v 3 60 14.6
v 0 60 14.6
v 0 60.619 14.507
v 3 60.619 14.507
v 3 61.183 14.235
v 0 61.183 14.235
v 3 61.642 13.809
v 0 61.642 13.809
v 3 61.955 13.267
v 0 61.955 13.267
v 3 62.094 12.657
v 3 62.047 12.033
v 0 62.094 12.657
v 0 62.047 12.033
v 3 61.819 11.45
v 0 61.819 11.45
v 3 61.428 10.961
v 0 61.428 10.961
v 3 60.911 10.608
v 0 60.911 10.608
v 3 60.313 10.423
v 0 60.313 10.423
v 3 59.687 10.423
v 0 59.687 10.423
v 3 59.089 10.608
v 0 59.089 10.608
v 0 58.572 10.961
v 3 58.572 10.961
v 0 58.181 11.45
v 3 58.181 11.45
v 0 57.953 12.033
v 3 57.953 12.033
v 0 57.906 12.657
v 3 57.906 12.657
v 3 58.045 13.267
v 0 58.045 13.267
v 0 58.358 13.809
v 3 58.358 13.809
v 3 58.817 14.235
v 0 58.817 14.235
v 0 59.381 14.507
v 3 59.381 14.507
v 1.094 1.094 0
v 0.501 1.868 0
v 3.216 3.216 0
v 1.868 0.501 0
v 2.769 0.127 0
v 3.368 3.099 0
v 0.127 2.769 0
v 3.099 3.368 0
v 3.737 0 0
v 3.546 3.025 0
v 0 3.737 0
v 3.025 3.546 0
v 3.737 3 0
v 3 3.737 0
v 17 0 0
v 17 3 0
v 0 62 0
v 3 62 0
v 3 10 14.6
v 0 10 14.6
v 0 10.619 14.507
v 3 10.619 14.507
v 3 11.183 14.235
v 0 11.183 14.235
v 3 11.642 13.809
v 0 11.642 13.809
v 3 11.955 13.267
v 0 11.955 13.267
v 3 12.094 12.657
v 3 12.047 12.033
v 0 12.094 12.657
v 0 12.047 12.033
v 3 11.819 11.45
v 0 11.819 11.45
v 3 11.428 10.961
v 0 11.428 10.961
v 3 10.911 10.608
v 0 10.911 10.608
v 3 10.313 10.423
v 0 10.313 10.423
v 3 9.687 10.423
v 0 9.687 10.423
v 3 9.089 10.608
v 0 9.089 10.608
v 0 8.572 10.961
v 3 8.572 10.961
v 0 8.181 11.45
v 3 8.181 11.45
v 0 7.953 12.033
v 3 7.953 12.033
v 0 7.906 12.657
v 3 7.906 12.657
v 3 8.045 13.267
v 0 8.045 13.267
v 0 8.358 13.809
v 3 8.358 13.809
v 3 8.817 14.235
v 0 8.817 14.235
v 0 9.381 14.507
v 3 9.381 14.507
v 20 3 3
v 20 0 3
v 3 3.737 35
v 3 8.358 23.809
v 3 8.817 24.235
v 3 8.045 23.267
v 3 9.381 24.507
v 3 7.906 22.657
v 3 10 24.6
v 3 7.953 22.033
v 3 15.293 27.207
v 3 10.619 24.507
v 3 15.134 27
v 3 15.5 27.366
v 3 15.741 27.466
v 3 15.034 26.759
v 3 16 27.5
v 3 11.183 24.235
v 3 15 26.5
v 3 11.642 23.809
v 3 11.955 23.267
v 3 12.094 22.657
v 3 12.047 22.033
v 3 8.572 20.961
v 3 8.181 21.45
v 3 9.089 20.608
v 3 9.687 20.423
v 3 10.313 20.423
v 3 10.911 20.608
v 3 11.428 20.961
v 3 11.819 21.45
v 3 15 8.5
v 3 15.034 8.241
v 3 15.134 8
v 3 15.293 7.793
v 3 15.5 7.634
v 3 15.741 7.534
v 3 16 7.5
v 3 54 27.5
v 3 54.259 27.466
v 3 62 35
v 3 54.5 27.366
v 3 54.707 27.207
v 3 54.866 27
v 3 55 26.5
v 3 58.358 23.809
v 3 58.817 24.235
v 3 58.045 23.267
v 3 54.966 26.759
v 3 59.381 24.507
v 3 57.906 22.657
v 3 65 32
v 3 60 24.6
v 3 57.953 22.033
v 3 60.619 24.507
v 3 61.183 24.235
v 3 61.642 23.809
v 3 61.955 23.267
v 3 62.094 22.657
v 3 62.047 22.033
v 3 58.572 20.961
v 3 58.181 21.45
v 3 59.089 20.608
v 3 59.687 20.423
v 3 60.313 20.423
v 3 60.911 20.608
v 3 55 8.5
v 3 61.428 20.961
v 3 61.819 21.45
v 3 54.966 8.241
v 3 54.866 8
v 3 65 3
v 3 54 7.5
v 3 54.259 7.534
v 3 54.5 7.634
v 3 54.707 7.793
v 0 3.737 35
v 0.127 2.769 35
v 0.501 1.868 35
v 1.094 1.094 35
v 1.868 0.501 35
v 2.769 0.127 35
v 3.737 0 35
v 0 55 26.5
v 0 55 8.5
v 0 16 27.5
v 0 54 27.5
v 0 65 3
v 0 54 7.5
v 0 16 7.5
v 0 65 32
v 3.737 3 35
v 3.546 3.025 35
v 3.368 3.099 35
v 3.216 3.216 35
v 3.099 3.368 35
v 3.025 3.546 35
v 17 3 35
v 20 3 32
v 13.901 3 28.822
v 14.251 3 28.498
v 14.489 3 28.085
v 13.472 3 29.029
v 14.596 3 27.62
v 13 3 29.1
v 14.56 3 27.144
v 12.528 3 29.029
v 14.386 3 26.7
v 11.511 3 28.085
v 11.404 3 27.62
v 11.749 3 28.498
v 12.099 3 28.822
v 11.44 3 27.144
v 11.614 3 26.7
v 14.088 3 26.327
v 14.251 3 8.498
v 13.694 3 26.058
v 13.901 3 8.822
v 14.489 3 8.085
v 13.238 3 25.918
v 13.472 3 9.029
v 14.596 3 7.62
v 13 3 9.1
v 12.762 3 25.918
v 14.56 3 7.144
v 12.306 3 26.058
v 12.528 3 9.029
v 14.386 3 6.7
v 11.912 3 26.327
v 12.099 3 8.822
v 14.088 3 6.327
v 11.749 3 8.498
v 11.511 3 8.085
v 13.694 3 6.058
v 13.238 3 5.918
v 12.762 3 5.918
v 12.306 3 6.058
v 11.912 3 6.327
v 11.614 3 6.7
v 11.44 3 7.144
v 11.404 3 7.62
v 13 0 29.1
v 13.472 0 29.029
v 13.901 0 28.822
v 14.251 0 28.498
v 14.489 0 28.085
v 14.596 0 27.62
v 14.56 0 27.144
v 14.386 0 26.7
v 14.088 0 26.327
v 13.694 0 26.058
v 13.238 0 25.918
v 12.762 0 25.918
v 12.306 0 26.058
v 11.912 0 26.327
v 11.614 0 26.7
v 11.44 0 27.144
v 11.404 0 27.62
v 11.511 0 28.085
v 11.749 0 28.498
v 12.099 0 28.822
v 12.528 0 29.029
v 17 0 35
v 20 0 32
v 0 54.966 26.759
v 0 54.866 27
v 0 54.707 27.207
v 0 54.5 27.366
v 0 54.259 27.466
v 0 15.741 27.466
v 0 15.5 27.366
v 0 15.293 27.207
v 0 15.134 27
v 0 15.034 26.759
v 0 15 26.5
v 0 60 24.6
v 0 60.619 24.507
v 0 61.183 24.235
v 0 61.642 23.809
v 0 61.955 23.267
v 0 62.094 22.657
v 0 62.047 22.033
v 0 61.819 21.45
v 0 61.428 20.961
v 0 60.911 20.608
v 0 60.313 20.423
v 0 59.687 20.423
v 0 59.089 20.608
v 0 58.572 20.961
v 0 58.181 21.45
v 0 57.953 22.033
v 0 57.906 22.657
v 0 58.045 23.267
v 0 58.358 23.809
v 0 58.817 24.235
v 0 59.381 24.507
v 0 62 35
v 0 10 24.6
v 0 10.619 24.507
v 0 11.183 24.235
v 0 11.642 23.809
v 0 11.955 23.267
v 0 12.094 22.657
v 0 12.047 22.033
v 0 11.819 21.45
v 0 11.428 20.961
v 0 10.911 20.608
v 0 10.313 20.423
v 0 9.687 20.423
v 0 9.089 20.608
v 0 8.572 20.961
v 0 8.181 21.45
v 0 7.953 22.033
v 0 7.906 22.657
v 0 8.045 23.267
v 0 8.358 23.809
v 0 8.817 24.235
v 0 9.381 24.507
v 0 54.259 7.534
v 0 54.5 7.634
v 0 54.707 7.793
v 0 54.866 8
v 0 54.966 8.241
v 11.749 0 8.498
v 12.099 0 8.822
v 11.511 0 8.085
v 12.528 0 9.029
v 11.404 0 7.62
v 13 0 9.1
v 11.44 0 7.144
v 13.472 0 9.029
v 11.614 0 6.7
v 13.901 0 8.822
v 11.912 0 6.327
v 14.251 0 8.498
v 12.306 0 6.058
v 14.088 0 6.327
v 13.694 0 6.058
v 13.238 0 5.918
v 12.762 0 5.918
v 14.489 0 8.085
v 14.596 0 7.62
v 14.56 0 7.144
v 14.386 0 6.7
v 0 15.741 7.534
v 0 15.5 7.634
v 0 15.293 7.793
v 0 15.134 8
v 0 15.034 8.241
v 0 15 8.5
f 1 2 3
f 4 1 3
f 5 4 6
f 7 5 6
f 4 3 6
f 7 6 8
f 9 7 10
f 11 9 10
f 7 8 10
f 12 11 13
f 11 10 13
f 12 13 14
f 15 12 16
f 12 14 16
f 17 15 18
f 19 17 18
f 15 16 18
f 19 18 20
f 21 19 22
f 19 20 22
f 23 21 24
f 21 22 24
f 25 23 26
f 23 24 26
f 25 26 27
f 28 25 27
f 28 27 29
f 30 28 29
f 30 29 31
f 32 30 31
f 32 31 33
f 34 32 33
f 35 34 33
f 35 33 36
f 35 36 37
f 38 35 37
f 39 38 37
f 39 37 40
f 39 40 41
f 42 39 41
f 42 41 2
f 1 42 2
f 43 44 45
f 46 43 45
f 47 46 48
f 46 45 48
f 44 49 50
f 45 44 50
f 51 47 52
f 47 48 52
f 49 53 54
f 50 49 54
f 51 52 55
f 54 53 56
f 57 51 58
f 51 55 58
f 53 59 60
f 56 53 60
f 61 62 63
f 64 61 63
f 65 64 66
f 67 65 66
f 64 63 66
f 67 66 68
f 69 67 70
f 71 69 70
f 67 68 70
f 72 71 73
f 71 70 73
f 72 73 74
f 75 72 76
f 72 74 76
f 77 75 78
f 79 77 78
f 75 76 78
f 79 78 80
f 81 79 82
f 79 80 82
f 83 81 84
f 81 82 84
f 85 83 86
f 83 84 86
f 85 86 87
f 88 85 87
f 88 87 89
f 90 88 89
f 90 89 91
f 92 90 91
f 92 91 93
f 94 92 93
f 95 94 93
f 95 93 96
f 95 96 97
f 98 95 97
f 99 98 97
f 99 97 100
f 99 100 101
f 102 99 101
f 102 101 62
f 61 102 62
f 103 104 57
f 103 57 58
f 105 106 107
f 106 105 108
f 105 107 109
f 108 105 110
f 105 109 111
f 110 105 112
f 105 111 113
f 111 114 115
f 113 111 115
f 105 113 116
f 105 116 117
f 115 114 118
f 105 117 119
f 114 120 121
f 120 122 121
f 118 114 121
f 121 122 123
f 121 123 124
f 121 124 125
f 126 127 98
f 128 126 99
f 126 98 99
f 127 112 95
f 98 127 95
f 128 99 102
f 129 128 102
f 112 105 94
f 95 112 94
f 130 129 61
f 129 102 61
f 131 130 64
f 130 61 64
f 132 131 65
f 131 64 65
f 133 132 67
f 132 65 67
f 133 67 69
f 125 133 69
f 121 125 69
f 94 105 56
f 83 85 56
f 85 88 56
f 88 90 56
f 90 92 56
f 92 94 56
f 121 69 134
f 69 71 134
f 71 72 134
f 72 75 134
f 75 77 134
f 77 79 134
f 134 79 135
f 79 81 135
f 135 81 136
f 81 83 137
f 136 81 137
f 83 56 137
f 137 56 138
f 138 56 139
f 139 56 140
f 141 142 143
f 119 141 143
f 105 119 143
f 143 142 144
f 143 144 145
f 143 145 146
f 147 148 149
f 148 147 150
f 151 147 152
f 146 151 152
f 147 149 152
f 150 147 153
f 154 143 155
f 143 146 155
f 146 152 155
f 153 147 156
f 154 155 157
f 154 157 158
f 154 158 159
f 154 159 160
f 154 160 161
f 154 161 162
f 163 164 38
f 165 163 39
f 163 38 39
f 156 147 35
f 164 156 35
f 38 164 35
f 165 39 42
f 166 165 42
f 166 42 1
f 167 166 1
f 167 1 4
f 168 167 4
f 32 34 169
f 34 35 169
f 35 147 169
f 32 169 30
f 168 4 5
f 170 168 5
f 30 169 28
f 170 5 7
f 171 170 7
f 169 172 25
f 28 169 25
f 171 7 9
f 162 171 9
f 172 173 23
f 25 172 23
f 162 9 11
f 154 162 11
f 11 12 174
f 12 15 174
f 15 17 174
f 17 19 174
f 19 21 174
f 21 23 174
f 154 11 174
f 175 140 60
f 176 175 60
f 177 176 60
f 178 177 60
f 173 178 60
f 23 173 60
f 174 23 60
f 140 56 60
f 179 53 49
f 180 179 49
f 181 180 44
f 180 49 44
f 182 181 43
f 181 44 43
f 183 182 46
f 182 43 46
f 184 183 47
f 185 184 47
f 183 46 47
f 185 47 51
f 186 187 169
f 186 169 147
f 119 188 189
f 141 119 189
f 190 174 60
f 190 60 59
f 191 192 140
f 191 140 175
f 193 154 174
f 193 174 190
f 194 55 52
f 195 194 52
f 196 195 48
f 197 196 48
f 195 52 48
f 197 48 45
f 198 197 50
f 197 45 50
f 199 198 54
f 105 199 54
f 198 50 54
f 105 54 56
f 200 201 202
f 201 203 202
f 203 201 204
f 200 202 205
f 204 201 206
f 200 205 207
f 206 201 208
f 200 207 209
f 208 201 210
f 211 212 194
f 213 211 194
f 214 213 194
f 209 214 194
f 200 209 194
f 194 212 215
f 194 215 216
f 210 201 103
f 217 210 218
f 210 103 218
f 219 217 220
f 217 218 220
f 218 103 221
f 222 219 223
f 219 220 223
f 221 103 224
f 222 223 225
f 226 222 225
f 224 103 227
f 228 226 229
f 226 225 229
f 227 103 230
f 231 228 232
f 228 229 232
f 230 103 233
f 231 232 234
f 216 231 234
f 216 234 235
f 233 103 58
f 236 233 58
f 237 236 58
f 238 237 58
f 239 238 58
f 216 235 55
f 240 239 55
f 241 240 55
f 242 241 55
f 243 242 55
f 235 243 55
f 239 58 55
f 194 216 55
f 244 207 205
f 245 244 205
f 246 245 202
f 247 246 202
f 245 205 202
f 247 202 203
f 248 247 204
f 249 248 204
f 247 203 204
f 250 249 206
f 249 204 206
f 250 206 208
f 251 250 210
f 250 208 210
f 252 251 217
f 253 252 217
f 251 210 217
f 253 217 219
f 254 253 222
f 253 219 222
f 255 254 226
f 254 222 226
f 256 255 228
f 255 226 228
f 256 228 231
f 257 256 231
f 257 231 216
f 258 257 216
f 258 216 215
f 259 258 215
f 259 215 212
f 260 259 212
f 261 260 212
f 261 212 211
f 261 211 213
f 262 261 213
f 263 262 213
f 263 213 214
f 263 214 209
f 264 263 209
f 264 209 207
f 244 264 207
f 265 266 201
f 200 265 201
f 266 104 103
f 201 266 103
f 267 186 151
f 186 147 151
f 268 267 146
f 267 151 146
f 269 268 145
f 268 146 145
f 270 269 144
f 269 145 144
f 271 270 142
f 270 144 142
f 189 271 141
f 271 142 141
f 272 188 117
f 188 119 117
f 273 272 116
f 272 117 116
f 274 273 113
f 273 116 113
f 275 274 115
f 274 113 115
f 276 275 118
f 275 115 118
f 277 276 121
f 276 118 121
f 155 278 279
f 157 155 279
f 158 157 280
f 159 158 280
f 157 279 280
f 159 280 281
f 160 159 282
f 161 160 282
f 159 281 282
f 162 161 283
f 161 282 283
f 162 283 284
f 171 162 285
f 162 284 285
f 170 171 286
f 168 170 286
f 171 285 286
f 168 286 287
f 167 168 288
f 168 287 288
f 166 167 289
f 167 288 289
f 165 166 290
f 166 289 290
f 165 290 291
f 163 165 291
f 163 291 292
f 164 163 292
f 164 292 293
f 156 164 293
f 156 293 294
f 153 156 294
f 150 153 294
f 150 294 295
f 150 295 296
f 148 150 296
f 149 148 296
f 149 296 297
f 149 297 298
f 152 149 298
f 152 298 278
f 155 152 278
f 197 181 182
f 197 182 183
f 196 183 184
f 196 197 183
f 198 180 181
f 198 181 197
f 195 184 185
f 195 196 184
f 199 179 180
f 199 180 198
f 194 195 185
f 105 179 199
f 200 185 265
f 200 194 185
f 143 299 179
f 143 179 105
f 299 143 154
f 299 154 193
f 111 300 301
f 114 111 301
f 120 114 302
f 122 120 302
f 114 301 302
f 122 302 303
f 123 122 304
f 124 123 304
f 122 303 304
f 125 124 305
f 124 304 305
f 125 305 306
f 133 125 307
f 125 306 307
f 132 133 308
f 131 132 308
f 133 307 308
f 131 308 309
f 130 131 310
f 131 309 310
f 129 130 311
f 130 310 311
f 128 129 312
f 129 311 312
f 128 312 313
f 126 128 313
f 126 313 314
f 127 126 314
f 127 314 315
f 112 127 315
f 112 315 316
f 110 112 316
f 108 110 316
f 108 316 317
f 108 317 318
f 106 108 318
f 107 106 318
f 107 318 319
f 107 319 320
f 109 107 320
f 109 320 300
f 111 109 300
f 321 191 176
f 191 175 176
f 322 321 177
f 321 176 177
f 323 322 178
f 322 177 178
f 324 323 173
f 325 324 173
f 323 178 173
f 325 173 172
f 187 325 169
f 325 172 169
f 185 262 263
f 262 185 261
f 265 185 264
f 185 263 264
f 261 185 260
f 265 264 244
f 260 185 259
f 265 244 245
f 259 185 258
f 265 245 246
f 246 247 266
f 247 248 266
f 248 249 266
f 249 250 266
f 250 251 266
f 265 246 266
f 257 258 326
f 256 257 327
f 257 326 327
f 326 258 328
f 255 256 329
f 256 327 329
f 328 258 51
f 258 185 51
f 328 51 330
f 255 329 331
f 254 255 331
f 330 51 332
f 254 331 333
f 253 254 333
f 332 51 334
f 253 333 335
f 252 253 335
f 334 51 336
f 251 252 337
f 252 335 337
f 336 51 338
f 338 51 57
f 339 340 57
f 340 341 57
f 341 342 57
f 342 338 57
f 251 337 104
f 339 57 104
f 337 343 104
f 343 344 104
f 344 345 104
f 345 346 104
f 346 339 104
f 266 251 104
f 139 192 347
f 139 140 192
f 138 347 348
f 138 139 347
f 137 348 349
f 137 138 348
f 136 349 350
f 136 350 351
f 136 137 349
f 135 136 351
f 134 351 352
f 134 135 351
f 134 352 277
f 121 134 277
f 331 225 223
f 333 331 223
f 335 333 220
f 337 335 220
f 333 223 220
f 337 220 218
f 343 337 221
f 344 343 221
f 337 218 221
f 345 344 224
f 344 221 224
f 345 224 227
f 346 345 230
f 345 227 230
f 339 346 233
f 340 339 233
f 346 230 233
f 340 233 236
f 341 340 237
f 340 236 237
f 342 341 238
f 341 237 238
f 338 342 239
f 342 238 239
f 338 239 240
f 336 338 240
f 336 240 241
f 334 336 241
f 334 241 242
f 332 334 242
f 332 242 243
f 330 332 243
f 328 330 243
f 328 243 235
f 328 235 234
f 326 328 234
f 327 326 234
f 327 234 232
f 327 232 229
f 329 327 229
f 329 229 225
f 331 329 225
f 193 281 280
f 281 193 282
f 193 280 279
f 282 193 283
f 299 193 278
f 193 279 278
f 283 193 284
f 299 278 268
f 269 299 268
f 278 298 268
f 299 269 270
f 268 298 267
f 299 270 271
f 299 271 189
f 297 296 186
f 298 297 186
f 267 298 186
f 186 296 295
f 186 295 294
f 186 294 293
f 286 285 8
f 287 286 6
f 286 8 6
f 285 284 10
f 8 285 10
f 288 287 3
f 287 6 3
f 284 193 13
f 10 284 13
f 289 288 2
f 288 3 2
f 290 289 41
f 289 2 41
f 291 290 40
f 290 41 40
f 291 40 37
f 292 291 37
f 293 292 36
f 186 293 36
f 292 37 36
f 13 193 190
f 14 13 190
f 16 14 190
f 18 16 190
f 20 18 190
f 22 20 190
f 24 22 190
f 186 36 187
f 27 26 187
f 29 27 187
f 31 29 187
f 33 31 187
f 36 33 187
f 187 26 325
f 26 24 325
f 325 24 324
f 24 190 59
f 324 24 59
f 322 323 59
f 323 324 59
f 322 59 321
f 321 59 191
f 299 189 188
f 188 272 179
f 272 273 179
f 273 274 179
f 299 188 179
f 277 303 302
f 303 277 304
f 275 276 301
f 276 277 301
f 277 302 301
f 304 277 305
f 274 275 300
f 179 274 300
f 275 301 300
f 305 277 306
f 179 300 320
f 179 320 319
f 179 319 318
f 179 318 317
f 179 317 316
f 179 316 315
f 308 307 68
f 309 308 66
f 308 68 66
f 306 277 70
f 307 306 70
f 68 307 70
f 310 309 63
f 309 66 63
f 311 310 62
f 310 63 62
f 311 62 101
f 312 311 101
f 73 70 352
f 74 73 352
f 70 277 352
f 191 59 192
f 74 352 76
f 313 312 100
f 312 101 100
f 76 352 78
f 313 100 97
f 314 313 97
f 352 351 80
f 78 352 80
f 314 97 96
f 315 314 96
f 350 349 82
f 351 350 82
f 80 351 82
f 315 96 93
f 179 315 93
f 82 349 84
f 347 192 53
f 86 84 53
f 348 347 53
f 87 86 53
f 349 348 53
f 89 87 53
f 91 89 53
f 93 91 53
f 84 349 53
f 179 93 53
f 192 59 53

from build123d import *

# Parameters (mm, degrees)
SM_BASE_FLANGE_1_DEPTH      = 35
SKETCH_2_R                  = 1.6
CUT_EXTRUDE_1_DEPTH         = 74.952687578
PATTERN_LINEAR_1_COUNT      = 2
PATTERN_LINEAR_1_PITCH      = 20
CHAMFER_1_SIZE              = 3
SKETCH_3_R                  = 2.1
CUT_EXTRUDE_2_DEPTH         = 77.485292704
PATTERN_LINEAR_2_COUNT      = 2
PATTERN_LINEAR_2_PITCH      = 10
PATTERN_LINEAR_2_COUNT_DIR2 = 2
PATTERN_LINEAR_2_PITCH_DIR2 = 50
SKETCH_4_W                  = 20
SKETCH_4_H                  = 40
CUT_EXTRUDE_3_DEPTH         = 77.485292704
FILLET_1_R                  = 1


# Sheet-metal steps are written as plain solids
with BuildPart() as part:
    # Sketch 1 → 基材-凸緣1 (new body)
    with BuildSketch(Plane.XY):
        with BuildLine():
            Line((0, 65), (0, 3.7366))
            ThreePointArc((0, 3.7366), (1.094424801, 1.094424801), (3.7366, 0))
            Line((3.7366, 0), (20, 0))
            Line((20, 0), (20, 3))
            Line((20, 3), (3.7366, 3))
            ThreePointArc((3.7366, 3), (3.215745145, 3.215745145), (3, 3.7366))
            Line((3, 3.7366), (3, 65))
            Line((3, 65), (0, 65))
        make_face()
    extrude(amount=SM_BASE_FLANGE_1_DEPTH)

    # Sketch 2 → 除料-伸長1 (cut, through all)
    with BuildSketch(Plane(origin=(0, 3, 0), x_dir=(1, 0, 0), z_dir=(0, 1, 0))):
        with Locations(Location((13, -7.5, 0), (0, 0, 270))):
            Circle(SKETCH_2_R)
    cut_extrude_1 = extrude(amount=-CUT_EXTRUDE_1_DEPTH, mode=Mode.SUBTRACT)

    # 直線複製排列1: 除料-伸長1 ×2
    with Locations(*[(0, 0, i * PATTERN_LINEAR_1_PITCH) for i in range(1, PATTERN_LINEAR_1_COUNT)]):
        add(cut_extrude_1, mode=Mode.SUBTRACT)

    # 導角1
    chamfer_1_edges = [part.edges().sort_by_distance(p)[0] for p in [
        (20, 1.5, 35),
        (20, 1.5, 0),
        (1.5, 65, 35),
        (1.5, 65, 0),
    ]]
    chamfer(chamfer_1_edges, length=CHAMFER_1_SIZE)

    # 草圖3 → 除料-伸長2 (cut, through all)
    with BuildSketch(Plane.ZY):
        with Locations((12.5, 60)):
            Circle(SKETCH_3_R)
    cut_extrude_2 = extrude(amount=-CUT_EXTRUDE_2_DEPTH, mode=Mode.SUBTRACT)

    # 直線複製排列2: Cut-Extrude 2 2 × 2
    with Locations(*[(0, -j * PATTERN_LINEAR_2_PITCH_DIR2, i * PATTERN_LINEAR_2_PITCH) for i in range(PATTERN_LINEAR_2_COUNT) for j in range(PATTERN_LINEAR_2_COUNT_DIR2) if (i, j) != (0, 0)]):
        add(cut_extrude_2, mode=Mode.SUBTRACT)

    # 草圖4 → 除料-伸長3 (cut, through all)
    with BuildSketch(Plane.ZY):
        with Locations((17.5, 35)):
            Rectangle(SKETCH_4_W, SKETCH_4_H)
    extrude(amount=-CUT_EXTRUDE_3_DEPTH, mode=Mode.SUBTRACT)

    # 圓角1
    fillet_1_edges = [part.edges().sort_by_distance(p)[0] for p in [
        (1.5, 15, 7.5),
        (1.5, 55, 7.5),
        (1.5, 55, 27.5),
        (1.5, 15, 27.5),
    ]]
    fillet(fillet_1_edges, radius=FILLET_1_R)


solid = part.part
